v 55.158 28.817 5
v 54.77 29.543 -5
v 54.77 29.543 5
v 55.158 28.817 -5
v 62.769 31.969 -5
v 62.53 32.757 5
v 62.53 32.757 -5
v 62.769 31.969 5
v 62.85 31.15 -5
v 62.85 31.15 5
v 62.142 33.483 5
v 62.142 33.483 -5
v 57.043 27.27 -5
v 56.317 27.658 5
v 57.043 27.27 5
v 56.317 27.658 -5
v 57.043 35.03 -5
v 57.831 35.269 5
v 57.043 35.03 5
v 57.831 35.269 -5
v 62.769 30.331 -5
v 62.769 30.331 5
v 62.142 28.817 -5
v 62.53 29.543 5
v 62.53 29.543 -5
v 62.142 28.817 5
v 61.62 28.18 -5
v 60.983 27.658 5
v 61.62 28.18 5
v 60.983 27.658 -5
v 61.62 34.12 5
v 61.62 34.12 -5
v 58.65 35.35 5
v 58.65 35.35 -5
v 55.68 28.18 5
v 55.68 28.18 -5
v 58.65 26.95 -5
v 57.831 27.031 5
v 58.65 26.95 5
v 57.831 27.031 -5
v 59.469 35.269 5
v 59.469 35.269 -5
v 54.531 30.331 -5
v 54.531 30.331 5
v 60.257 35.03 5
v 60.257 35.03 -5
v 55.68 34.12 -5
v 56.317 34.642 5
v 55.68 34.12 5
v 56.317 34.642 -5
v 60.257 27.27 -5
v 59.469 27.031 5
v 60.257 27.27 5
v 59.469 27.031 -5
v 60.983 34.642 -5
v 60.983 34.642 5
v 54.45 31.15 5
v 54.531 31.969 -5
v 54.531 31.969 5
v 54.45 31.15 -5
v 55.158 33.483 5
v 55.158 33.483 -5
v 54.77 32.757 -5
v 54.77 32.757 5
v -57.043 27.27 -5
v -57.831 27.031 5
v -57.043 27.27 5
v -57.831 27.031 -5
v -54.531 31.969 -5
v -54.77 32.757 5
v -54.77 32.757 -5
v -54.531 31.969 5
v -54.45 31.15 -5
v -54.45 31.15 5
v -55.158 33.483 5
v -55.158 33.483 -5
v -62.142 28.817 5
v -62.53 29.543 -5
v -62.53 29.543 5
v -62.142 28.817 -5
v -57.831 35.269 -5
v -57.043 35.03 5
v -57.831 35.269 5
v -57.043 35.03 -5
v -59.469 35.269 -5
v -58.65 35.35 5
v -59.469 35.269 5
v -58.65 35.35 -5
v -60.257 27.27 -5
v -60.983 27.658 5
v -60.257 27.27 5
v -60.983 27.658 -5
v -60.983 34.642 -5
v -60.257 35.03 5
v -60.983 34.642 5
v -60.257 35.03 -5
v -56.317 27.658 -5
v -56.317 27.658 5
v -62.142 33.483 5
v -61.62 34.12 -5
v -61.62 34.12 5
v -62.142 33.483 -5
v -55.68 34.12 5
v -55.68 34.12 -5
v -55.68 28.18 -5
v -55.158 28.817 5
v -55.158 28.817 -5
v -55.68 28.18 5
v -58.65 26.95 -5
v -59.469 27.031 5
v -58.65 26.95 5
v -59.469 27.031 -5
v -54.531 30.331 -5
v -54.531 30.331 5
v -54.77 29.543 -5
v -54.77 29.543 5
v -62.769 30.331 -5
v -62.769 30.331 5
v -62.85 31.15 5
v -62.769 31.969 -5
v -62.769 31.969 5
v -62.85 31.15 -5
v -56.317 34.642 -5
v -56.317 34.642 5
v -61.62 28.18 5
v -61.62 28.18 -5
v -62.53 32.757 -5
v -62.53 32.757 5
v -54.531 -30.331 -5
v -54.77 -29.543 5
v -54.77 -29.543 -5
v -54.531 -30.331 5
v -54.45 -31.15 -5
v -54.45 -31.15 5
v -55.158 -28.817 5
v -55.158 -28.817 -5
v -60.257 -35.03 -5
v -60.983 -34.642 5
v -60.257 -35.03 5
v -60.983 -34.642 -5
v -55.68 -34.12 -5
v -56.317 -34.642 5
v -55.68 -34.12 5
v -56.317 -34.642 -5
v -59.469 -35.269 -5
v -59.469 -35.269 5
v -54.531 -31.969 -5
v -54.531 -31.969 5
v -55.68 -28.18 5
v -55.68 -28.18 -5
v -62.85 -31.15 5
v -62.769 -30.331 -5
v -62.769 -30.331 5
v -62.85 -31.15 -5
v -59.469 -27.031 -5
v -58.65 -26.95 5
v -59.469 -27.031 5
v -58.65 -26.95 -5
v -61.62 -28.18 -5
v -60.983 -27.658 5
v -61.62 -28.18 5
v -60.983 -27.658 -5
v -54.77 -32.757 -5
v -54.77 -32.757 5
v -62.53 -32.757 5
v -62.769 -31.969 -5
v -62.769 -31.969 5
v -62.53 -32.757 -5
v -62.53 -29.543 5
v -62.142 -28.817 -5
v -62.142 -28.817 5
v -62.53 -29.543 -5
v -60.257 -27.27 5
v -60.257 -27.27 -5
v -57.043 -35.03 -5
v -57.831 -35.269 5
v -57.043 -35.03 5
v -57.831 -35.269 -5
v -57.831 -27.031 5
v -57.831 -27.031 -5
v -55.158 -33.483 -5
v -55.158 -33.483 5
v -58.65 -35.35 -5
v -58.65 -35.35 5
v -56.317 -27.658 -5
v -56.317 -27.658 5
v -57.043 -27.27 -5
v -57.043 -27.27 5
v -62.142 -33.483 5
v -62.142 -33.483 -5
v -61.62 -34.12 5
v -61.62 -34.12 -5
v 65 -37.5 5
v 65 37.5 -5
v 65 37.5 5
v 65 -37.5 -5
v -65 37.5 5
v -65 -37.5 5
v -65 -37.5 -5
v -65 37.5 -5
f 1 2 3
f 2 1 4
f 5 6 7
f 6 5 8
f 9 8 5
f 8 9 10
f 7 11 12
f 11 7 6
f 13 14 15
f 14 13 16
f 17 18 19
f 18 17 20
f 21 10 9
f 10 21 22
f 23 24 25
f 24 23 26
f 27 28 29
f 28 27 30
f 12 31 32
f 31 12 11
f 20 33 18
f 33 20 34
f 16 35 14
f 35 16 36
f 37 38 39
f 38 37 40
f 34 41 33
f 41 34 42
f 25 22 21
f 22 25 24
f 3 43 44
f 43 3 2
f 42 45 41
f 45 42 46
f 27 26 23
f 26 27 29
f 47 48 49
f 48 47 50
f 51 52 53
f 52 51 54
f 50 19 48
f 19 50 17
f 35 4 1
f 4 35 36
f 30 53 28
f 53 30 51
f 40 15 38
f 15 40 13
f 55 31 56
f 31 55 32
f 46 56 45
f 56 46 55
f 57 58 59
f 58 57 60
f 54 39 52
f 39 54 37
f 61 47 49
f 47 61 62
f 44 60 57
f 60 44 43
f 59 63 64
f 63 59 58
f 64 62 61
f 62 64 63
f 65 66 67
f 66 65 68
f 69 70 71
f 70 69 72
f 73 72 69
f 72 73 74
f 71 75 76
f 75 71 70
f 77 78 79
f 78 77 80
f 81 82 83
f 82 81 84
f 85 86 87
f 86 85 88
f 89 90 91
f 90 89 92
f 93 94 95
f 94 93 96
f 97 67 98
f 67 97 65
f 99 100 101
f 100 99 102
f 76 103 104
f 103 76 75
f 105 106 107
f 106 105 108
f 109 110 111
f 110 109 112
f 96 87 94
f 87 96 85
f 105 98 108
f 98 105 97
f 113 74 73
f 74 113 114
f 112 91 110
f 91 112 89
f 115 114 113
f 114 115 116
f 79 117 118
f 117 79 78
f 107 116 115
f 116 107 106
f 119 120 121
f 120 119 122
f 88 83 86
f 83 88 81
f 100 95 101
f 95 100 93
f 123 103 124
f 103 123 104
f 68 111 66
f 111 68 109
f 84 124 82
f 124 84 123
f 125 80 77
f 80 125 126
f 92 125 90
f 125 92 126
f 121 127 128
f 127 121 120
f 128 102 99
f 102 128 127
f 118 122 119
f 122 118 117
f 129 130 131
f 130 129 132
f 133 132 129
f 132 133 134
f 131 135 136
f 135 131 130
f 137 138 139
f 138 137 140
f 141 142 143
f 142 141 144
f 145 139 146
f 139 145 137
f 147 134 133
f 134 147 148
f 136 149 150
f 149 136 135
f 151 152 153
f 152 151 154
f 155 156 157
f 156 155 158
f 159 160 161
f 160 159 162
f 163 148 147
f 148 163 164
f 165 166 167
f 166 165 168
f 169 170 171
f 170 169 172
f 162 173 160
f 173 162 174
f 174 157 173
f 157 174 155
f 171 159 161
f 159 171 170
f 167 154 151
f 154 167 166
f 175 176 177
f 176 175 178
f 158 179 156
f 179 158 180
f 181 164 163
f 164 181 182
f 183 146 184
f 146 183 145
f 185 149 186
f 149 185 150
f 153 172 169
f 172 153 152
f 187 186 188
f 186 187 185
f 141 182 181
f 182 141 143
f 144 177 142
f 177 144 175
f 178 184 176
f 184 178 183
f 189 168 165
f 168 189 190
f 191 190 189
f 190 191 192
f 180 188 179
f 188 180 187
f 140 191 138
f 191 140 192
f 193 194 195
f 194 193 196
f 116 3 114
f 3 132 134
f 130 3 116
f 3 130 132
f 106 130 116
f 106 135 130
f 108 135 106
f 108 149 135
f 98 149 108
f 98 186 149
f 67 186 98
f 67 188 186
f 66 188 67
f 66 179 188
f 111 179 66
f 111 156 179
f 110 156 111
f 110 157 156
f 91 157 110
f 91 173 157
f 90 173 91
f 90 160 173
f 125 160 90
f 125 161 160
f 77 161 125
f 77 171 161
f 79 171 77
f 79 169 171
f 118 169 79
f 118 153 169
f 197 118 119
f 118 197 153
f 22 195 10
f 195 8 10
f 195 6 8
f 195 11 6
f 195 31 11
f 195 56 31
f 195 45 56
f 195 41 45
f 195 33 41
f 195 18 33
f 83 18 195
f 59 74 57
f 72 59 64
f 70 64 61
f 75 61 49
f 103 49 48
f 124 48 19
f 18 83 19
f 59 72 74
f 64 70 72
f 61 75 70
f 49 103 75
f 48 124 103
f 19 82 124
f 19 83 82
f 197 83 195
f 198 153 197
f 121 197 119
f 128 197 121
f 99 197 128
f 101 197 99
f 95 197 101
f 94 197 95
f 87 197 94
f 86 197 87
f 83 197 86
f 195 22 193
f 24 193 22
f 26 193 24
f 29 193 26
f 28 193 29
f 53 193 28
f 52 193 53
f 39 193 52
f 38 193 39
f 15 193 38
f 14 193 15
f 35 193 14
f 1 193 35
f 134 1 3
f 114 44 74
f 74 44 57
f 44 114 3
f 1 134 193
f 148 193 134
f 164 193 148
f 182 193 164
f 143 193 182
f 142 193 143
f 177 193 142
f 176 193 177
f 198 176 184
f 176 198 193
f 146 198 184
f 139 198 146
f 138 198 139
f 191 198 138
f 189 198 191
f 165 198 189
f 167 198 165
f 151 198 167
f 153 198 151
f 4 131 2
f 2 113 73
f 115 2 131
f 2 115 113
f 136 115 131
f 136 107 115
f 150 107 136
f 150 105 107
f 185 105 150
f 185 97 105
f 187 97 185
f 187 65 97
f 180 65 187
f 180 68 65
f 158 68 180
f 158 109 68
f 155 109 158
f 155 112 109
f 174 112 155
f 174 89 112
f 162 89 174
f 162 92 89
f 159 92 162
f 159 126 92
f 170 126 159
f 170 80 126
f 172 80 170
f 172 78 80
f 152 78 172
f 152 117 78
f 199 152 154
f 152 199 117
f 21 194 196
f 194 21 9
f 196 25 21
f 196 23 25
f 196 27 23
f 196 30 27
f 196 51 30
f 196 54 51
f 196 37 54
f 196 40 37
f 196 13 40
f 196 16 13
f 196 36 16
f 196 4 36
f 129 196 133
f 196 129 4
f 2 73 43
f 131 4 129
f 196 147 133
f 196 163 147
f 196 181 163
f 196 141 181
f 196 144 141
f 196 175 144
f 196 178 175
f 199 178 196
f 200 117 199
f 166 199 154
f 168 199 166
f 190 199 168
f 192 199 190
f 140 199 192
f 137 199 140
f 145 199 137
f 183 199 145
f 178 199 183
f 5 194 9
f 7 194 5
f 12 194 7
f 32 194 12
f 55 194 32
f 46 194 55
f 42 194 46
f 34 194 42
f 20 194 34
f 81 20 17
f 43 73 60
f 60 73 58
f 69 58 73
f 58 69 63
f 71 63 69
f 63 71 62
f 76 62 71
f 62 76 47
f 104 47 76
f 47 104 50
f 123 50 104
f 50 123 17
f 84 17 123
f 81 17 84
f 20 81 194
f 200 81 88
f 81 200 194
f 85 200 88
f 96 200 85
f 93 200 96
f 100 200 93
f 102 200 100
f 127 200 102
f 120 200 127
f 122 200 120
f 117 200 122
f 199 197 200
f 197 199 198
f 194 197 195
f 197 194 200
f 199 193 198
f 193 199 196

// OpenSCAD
$fn = 32;

// ----------------------------------------------------------------------
// Corner plate 130 x 75 x 10
// 3 holes, centres taken from the edge offset
// ----------------------------------------------------------------------

// --- parameters (mm) ---
plate = [130, 75, 10];  // overall size (x, y, z)
holes = 3;              // number of holes the drawing asks for
hole_d = 8.4;           // hole diameter
edge = 6.35;            // hole centre offset from the plate edge

// --- derived feature positions (mm) ---
corner_x = plate[0] / 2 - edge;  // = 58.65   corner hole X
corner_y = plate[1] / 2 - edge;  // = 31.15   corner hole Y
feature_centers = [
  [corner_x, corner_y],
  [-corner_x, corner_y],
  [-corner_x, -corner_y]
];   // hole centres the loop below drills

// plate outline, every hole drilled through with the same cutters
difference() {
  cube(plate, center = true);
  for (centre = feature_centers)
    translate([centre[0], centre[1], 0])
      cylinder(d = hole_d, h = plate[2] + 2, center = true);
}
